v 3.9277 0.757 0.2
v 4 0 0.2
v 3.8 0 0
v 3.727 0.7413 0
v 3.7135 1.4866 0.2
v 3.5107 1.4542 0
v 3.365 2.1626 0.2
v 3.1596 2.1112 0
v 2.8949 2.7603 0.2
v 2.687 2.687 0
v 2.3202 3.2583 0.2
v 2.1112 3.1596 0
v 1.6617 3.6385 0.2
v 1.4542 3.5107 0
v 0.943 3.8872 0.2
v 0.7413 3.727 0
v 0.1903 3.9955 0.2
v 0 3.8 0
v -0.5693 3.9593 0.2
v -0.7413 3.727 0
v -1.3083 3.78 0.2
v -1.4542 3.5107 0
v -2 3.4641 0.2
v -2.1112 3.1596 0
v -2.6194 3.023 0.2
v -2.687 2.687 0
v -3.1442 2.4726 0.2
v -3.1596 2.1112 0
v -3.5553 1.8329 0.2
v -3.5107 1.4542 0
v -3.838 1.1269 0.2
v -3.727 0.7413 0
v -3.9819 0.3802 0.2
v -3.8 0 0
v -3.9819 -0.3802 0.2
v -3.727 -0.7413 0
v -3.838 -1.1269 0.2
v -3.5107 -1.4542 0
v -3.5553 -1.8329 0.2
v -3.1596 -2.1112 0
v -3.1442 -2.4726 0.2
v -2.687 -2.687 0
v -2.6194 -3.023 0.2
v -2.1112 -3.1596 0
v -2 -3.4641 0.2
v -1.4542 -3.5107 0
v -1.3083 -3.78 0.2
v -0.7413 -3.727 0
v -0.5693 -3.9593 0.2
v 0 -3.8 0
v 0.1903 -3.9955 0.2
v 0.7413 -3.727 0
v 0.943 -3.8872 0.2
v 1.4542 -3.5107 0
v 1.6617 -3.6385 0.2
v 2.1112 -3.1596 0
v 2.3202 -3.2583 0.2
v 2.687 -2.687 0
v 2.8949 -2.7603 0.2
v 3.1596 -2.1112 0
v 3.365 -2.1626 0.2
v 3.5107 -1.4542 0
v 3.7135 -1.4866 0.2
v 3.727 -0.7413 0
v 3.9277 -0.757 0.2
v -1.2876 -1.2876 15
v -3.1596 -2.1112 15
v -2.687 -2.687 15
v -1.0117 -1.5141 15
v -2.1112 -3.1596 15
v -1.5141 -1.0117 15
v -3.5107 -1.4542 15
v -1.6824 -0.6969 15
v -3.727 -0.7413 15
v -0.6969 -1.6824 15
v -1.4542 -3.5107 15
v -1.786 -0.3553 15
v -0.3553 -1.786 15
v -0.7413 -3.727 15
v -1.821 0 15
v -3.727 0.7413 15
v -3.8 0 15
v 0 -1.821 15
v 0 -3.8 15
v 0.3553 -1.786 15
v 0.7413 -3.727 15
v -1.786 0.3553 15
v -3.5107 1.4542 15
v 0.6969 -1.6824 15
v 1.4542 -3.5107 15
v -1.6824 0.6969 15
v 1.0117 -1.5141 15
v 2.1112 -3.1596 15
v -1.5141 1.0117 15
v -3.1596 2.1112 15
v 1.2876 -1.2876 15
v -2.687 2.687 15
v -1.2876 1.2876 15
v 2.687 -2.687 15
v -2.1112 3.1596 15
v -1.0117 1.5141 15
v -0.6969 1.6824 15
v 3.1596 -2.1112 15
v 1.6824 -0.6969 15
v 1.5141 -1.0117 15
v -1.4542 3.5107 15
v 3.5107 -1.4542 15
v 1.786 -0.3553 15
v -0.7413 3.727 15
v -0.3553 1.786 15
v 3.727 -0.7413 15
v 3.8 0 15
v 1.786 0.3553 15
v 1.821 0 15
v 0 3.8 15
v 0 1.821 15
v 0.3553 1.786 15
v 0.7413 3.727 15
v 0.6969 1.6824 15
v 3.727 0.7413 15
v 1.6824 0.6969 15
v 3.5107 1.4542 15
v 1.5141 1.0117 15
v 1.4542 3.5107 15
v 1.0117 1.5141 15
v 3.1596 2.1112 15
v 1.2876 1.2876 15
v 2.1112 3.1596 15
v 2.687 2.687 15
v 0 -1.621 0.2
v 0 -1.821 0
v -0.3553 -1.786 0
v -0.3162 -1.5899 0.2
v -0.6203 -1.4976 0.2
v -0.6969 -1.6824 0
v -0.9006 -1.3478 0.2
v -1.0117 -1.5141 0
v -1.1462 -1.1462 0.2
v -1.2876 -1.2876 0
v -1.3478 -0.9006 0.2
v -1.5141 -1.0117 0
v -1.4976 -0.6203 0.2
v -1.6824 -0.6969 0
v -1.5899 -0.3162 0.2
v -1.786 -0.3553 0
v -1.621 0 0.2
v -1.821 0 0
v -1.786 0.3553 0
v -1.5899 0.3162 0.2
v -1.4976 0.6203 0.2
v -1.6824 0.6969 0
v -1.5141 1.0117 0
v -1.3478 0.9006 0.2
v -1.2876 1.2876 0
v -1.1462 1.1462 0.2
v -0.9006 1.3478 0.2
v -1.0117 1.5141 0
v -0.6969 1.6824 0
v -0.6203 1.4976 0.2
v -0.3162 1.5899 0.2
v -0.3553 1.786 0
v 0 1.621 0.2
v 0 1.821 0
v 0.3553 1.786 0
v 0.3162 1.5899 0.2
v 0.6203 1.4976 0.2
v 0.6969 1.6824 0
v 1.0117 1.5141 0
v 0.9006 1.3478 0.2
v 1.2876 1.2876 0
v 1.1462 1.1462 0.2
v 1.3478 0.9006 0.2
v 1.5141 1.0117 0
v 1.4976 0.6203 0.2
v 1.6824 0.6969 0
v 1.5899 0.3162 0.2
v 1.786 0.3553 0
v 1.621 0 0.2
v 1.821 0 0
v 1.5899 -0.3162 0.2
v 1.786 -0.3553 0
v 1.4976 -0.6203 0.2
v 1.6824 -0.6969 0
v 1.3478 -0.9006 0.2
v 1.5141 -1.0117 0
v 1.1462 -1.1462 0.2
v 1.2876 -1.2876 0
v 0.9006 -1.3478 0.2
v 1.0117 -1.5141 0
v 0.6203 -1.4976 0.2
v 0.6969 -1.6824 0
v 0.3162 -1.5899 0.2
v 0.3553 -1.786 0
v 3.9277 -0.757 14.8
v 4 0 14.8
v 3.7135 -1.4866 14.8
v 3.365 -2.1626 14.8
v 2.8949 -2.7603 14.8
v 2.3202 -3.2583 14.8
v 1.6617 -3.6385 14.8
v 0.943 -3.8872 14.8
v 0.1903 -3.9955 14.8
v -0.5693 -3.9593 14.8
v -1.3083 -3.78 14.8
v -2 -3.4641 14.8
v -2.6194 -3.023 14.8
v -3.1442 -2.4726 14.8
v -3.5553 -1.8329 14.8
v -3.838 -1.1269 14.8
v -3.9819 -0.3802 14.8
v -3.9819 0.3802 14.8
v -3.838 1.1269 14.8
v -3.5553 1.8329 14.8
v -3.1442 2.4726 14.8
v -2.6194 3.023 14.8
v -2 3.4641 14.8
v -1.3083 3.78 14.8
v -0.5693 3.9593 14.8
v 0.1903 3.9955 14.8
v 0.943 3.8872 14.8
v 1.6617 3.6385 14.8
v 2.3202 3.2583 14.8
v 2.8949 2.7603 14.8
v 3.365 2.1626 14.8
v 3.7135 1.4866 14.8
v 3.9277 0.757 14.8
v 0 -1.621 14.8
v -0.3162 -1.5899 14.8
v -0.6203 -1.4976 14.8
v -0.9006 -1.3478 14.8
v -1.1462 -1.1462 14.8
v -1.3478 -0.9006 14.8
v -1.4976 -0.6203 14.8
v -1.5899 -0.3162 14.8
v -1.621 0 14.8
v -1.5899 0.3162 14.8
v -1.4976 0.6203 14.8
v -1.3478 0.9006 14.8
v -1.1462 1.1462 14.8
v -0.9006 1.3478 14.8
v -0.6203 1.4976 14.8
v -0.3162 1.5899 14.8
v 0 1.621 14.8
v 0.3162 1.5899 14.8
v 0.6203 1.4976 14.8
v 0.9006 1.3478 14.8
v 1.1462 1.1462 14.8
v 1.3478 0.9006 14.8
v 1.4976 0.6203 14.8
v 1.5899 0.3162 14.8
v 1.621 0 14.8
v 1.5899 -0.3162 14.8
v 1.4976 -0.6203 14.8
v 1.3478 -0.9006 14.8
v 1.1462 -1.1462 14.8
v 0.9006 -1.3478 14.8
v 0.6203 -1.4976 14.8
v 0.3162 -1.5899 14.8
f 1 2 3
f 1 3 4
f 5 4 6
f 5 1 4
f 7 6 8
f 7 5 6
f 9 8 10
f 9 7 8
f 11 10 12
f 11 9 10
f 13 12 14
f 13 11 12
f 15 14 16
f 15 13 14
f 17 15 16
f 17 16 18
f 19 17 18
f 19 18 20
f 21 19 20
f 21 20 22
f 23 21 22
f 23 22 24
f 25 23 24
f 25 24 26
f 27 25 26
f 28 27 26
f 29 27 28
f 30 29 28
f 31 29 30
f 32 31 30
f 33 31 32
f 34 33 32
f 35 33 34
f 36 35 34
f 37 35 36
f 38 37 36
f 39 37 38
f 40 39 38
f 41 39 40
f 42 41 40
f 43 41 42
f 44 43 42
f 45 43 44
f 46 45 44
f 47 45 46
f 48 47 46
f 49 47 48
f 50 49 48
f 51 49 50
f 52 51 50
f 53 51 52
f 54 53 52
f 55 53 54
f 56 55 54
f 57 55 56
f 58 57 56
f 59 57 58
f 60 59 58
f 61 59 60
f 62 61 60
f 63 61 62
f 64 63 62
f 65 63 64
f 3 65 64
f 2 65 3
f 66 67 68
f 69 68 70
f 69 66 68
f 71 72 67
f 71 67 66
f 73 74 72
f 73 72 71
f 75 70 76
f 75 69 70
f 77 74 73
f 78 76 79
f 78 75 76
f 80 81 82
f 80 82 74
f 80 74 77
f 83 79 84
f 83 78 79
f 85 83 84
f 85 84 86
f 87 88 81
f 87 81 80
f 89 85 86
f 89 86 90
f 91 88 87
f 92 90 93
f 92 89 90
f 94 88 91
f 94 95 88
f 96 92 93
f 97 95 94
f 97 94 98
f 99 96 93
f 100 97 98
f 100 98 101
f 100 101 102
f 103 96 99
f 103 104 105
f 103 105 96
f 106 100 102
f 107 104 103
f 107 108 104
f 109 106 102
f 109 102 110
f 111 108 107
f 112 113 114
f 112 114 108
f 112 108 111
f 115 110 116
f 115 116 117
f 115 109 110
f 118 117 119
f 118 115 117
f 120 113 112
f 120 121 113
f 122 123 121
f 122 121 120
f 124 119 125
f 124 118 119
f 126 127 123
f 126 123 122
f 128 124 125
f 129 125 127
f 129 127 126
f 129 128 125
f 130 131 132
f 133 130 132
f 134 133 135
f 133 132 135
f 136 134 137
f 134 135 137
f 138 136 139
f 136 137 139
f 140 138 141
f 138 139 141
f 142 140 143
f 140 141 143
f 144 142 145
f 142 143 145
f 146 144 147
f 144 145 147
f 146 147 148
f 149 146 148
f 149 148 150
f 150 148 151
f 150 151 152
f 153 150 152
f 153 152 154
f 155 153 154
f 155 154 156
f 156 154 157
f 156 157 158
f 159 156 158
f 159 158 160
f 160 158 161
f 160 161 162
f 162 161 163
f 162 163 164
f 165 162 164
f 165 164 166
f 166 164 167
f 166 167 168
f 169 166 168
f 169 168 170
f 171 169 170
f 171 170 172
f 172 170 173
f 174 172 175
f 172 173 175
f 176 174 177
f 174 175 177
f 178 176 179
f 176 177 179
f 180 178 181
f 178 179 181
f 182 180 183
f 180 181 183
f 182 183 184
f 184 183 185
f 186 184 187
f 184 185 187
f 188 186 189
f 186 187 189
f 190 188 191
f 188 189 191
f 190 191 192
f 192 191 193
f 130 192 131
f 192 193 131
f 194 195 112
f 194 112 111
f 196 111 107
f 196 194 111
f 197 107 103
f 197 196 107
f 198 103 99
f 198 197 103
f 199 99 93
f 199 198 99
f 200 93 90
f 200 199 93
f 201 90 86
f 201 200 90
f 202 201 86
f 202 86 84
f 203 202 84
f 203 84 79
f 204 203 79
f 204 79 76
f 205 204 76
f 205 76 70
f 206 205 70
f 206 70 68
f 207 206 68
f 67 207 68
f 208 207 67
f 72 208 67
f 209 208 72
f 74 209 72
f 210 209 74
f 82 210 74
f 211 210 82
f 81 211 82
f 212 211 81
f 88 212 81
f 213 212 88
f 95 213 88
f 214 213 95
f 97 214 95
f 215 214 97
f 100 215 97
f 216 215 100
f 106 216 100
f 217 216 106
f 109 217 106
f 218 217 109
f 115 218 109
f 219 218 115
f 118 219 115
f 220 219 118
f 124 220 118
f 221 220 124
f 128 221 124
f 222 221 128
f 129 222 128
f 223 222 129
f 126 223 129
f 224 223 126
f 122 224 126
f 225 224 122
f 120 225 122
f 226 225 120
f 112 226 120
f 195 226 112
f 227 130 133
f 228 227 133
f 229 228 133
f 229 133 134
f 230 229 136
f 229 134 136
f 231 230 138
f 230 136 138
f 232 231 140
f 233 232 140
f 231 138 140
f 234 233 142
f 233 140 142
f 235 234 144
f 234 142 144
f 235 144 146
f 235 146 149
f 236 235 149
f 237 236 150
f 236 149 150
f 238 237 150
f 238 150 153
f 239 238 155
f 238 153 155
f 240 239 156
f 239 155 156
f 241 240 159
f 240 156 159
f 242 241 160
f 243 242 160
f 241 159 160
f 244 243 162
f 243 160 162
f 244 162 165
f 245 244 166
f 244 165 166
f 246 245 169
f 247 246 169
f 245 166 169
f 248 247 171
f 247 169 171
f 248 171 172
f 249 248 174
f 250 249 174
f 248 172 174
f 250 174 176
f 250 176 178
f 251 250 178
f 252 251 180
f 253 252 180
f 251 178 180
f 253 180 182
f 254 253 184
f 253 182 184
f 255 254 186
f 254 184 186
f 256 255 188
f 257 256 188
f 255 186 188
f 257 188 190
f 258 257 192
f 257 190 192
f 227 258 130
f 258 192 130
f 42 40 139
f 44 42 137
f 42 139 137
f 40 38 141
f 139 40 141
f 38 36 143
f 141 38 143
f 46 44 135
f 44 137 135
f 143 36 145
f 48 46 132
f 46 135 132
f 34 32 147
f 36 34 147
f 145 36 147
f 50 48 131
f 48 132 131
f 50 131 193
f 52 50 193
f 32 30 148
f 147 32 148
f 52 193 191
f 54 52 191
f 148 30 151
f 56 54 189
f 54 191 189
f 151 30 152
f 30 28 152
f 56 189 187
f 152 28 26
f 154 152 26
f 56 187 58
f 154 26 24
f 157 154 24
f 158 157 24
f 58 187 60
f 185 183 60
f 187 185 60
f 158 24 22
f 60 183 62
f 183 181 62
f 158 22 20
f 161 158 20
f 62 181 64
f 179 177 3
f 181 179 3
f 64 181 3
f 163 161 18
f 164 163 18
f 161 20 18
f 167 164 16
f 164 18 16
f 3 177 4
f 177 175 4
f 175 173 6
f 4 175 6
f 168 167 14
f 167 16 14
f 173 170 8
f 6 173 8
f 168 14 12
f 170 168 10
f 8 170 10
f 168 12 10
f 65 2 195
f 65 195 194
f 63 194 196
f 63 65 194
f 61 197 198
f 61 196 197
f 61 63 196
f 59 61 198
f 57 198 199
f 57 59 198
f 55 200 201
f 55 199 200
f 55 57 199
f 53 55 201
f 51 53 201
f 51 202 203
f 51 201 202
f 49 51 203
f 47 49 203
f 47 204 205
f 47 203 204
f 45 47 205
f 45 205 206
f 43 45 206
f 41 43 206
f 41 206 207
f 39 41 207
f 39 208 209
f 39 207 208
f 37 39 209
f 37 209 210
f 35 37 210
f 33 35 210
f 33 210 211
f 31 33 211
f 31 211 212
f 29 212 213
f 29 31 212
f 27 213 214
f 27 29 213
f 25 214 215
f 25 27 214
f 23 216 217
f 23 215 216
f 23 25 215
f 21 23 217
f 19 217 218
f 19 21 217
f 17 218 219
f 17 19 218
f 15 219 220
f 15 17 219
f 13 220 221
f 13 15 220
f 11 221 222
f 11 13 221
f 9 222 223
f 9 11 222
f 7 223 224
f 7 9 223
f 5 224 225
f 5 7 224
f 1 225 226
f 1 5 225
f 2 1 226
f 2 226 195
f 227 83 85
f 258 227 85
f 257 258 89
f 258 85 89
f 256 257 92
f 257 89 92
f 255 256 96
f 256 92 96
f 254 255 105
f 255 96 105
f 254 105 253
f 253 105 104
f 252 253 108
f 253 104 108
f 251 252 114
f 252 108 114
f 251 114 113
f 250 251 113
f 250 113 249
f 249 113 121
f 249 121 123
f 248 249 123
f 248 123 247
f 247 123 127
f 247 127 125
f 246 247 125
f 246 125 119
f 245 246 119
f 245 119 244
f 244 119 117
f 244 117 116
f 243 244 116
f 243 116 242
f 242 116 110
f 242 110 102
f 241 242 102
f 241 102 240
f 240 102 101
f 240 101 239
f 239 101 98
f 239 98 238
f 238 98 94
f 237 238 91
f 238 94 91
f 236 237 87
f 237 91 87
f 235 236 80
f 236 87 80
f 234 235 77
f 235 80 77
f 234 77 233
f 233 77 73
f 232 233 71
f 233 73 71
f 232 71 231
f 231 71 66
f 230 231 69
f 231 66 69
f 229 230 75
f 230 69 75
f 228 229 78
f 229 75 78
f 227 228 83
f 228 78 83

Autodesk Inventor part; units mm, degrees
ref_plane "YZ Plane" through (0, 0, 0) normal (1, 0, 0) x (0, 1, 0)
ref_plane "XZ Plane" through (0, 0, 0) normal (0, 1, 0) x (-1, 0, 0)
ref_plane "XY Plane" through (0, 0, 0) normal (0, 0, 1) x (1, 0, 0)
sketch "スケッチ1" plane through (0, 0, 0) normal (0, 0, 1) x (1, 0, 0)
  circle A0 centre (0, 0) radius 4
  dimension "d13" = 8
extrude "押し出し1" add sketch "スケッチ1" along normal blind 15
sketch "スケッチ2" plane through (0, 0, 15) normal (0, 0, 1) x (1, 0, 0)
  point P0 (0, 0)
  point P1 (0, 0)
hole "穴1" at (0, 0, 15) direction (0, 0, -1) diameter 3.242 end through all thread size "M4x0.7" class "6H" standard "ANSI Metric M Profile"
chamfer "面取り1" distance 0.2 angle 45 4 edges at (0, 1.621, 15) (0, 1.621, 0) (-4, 0, 15) (-4, 0, 0)
properties part number "ARF-415" material "鋼、炭素鋼"
